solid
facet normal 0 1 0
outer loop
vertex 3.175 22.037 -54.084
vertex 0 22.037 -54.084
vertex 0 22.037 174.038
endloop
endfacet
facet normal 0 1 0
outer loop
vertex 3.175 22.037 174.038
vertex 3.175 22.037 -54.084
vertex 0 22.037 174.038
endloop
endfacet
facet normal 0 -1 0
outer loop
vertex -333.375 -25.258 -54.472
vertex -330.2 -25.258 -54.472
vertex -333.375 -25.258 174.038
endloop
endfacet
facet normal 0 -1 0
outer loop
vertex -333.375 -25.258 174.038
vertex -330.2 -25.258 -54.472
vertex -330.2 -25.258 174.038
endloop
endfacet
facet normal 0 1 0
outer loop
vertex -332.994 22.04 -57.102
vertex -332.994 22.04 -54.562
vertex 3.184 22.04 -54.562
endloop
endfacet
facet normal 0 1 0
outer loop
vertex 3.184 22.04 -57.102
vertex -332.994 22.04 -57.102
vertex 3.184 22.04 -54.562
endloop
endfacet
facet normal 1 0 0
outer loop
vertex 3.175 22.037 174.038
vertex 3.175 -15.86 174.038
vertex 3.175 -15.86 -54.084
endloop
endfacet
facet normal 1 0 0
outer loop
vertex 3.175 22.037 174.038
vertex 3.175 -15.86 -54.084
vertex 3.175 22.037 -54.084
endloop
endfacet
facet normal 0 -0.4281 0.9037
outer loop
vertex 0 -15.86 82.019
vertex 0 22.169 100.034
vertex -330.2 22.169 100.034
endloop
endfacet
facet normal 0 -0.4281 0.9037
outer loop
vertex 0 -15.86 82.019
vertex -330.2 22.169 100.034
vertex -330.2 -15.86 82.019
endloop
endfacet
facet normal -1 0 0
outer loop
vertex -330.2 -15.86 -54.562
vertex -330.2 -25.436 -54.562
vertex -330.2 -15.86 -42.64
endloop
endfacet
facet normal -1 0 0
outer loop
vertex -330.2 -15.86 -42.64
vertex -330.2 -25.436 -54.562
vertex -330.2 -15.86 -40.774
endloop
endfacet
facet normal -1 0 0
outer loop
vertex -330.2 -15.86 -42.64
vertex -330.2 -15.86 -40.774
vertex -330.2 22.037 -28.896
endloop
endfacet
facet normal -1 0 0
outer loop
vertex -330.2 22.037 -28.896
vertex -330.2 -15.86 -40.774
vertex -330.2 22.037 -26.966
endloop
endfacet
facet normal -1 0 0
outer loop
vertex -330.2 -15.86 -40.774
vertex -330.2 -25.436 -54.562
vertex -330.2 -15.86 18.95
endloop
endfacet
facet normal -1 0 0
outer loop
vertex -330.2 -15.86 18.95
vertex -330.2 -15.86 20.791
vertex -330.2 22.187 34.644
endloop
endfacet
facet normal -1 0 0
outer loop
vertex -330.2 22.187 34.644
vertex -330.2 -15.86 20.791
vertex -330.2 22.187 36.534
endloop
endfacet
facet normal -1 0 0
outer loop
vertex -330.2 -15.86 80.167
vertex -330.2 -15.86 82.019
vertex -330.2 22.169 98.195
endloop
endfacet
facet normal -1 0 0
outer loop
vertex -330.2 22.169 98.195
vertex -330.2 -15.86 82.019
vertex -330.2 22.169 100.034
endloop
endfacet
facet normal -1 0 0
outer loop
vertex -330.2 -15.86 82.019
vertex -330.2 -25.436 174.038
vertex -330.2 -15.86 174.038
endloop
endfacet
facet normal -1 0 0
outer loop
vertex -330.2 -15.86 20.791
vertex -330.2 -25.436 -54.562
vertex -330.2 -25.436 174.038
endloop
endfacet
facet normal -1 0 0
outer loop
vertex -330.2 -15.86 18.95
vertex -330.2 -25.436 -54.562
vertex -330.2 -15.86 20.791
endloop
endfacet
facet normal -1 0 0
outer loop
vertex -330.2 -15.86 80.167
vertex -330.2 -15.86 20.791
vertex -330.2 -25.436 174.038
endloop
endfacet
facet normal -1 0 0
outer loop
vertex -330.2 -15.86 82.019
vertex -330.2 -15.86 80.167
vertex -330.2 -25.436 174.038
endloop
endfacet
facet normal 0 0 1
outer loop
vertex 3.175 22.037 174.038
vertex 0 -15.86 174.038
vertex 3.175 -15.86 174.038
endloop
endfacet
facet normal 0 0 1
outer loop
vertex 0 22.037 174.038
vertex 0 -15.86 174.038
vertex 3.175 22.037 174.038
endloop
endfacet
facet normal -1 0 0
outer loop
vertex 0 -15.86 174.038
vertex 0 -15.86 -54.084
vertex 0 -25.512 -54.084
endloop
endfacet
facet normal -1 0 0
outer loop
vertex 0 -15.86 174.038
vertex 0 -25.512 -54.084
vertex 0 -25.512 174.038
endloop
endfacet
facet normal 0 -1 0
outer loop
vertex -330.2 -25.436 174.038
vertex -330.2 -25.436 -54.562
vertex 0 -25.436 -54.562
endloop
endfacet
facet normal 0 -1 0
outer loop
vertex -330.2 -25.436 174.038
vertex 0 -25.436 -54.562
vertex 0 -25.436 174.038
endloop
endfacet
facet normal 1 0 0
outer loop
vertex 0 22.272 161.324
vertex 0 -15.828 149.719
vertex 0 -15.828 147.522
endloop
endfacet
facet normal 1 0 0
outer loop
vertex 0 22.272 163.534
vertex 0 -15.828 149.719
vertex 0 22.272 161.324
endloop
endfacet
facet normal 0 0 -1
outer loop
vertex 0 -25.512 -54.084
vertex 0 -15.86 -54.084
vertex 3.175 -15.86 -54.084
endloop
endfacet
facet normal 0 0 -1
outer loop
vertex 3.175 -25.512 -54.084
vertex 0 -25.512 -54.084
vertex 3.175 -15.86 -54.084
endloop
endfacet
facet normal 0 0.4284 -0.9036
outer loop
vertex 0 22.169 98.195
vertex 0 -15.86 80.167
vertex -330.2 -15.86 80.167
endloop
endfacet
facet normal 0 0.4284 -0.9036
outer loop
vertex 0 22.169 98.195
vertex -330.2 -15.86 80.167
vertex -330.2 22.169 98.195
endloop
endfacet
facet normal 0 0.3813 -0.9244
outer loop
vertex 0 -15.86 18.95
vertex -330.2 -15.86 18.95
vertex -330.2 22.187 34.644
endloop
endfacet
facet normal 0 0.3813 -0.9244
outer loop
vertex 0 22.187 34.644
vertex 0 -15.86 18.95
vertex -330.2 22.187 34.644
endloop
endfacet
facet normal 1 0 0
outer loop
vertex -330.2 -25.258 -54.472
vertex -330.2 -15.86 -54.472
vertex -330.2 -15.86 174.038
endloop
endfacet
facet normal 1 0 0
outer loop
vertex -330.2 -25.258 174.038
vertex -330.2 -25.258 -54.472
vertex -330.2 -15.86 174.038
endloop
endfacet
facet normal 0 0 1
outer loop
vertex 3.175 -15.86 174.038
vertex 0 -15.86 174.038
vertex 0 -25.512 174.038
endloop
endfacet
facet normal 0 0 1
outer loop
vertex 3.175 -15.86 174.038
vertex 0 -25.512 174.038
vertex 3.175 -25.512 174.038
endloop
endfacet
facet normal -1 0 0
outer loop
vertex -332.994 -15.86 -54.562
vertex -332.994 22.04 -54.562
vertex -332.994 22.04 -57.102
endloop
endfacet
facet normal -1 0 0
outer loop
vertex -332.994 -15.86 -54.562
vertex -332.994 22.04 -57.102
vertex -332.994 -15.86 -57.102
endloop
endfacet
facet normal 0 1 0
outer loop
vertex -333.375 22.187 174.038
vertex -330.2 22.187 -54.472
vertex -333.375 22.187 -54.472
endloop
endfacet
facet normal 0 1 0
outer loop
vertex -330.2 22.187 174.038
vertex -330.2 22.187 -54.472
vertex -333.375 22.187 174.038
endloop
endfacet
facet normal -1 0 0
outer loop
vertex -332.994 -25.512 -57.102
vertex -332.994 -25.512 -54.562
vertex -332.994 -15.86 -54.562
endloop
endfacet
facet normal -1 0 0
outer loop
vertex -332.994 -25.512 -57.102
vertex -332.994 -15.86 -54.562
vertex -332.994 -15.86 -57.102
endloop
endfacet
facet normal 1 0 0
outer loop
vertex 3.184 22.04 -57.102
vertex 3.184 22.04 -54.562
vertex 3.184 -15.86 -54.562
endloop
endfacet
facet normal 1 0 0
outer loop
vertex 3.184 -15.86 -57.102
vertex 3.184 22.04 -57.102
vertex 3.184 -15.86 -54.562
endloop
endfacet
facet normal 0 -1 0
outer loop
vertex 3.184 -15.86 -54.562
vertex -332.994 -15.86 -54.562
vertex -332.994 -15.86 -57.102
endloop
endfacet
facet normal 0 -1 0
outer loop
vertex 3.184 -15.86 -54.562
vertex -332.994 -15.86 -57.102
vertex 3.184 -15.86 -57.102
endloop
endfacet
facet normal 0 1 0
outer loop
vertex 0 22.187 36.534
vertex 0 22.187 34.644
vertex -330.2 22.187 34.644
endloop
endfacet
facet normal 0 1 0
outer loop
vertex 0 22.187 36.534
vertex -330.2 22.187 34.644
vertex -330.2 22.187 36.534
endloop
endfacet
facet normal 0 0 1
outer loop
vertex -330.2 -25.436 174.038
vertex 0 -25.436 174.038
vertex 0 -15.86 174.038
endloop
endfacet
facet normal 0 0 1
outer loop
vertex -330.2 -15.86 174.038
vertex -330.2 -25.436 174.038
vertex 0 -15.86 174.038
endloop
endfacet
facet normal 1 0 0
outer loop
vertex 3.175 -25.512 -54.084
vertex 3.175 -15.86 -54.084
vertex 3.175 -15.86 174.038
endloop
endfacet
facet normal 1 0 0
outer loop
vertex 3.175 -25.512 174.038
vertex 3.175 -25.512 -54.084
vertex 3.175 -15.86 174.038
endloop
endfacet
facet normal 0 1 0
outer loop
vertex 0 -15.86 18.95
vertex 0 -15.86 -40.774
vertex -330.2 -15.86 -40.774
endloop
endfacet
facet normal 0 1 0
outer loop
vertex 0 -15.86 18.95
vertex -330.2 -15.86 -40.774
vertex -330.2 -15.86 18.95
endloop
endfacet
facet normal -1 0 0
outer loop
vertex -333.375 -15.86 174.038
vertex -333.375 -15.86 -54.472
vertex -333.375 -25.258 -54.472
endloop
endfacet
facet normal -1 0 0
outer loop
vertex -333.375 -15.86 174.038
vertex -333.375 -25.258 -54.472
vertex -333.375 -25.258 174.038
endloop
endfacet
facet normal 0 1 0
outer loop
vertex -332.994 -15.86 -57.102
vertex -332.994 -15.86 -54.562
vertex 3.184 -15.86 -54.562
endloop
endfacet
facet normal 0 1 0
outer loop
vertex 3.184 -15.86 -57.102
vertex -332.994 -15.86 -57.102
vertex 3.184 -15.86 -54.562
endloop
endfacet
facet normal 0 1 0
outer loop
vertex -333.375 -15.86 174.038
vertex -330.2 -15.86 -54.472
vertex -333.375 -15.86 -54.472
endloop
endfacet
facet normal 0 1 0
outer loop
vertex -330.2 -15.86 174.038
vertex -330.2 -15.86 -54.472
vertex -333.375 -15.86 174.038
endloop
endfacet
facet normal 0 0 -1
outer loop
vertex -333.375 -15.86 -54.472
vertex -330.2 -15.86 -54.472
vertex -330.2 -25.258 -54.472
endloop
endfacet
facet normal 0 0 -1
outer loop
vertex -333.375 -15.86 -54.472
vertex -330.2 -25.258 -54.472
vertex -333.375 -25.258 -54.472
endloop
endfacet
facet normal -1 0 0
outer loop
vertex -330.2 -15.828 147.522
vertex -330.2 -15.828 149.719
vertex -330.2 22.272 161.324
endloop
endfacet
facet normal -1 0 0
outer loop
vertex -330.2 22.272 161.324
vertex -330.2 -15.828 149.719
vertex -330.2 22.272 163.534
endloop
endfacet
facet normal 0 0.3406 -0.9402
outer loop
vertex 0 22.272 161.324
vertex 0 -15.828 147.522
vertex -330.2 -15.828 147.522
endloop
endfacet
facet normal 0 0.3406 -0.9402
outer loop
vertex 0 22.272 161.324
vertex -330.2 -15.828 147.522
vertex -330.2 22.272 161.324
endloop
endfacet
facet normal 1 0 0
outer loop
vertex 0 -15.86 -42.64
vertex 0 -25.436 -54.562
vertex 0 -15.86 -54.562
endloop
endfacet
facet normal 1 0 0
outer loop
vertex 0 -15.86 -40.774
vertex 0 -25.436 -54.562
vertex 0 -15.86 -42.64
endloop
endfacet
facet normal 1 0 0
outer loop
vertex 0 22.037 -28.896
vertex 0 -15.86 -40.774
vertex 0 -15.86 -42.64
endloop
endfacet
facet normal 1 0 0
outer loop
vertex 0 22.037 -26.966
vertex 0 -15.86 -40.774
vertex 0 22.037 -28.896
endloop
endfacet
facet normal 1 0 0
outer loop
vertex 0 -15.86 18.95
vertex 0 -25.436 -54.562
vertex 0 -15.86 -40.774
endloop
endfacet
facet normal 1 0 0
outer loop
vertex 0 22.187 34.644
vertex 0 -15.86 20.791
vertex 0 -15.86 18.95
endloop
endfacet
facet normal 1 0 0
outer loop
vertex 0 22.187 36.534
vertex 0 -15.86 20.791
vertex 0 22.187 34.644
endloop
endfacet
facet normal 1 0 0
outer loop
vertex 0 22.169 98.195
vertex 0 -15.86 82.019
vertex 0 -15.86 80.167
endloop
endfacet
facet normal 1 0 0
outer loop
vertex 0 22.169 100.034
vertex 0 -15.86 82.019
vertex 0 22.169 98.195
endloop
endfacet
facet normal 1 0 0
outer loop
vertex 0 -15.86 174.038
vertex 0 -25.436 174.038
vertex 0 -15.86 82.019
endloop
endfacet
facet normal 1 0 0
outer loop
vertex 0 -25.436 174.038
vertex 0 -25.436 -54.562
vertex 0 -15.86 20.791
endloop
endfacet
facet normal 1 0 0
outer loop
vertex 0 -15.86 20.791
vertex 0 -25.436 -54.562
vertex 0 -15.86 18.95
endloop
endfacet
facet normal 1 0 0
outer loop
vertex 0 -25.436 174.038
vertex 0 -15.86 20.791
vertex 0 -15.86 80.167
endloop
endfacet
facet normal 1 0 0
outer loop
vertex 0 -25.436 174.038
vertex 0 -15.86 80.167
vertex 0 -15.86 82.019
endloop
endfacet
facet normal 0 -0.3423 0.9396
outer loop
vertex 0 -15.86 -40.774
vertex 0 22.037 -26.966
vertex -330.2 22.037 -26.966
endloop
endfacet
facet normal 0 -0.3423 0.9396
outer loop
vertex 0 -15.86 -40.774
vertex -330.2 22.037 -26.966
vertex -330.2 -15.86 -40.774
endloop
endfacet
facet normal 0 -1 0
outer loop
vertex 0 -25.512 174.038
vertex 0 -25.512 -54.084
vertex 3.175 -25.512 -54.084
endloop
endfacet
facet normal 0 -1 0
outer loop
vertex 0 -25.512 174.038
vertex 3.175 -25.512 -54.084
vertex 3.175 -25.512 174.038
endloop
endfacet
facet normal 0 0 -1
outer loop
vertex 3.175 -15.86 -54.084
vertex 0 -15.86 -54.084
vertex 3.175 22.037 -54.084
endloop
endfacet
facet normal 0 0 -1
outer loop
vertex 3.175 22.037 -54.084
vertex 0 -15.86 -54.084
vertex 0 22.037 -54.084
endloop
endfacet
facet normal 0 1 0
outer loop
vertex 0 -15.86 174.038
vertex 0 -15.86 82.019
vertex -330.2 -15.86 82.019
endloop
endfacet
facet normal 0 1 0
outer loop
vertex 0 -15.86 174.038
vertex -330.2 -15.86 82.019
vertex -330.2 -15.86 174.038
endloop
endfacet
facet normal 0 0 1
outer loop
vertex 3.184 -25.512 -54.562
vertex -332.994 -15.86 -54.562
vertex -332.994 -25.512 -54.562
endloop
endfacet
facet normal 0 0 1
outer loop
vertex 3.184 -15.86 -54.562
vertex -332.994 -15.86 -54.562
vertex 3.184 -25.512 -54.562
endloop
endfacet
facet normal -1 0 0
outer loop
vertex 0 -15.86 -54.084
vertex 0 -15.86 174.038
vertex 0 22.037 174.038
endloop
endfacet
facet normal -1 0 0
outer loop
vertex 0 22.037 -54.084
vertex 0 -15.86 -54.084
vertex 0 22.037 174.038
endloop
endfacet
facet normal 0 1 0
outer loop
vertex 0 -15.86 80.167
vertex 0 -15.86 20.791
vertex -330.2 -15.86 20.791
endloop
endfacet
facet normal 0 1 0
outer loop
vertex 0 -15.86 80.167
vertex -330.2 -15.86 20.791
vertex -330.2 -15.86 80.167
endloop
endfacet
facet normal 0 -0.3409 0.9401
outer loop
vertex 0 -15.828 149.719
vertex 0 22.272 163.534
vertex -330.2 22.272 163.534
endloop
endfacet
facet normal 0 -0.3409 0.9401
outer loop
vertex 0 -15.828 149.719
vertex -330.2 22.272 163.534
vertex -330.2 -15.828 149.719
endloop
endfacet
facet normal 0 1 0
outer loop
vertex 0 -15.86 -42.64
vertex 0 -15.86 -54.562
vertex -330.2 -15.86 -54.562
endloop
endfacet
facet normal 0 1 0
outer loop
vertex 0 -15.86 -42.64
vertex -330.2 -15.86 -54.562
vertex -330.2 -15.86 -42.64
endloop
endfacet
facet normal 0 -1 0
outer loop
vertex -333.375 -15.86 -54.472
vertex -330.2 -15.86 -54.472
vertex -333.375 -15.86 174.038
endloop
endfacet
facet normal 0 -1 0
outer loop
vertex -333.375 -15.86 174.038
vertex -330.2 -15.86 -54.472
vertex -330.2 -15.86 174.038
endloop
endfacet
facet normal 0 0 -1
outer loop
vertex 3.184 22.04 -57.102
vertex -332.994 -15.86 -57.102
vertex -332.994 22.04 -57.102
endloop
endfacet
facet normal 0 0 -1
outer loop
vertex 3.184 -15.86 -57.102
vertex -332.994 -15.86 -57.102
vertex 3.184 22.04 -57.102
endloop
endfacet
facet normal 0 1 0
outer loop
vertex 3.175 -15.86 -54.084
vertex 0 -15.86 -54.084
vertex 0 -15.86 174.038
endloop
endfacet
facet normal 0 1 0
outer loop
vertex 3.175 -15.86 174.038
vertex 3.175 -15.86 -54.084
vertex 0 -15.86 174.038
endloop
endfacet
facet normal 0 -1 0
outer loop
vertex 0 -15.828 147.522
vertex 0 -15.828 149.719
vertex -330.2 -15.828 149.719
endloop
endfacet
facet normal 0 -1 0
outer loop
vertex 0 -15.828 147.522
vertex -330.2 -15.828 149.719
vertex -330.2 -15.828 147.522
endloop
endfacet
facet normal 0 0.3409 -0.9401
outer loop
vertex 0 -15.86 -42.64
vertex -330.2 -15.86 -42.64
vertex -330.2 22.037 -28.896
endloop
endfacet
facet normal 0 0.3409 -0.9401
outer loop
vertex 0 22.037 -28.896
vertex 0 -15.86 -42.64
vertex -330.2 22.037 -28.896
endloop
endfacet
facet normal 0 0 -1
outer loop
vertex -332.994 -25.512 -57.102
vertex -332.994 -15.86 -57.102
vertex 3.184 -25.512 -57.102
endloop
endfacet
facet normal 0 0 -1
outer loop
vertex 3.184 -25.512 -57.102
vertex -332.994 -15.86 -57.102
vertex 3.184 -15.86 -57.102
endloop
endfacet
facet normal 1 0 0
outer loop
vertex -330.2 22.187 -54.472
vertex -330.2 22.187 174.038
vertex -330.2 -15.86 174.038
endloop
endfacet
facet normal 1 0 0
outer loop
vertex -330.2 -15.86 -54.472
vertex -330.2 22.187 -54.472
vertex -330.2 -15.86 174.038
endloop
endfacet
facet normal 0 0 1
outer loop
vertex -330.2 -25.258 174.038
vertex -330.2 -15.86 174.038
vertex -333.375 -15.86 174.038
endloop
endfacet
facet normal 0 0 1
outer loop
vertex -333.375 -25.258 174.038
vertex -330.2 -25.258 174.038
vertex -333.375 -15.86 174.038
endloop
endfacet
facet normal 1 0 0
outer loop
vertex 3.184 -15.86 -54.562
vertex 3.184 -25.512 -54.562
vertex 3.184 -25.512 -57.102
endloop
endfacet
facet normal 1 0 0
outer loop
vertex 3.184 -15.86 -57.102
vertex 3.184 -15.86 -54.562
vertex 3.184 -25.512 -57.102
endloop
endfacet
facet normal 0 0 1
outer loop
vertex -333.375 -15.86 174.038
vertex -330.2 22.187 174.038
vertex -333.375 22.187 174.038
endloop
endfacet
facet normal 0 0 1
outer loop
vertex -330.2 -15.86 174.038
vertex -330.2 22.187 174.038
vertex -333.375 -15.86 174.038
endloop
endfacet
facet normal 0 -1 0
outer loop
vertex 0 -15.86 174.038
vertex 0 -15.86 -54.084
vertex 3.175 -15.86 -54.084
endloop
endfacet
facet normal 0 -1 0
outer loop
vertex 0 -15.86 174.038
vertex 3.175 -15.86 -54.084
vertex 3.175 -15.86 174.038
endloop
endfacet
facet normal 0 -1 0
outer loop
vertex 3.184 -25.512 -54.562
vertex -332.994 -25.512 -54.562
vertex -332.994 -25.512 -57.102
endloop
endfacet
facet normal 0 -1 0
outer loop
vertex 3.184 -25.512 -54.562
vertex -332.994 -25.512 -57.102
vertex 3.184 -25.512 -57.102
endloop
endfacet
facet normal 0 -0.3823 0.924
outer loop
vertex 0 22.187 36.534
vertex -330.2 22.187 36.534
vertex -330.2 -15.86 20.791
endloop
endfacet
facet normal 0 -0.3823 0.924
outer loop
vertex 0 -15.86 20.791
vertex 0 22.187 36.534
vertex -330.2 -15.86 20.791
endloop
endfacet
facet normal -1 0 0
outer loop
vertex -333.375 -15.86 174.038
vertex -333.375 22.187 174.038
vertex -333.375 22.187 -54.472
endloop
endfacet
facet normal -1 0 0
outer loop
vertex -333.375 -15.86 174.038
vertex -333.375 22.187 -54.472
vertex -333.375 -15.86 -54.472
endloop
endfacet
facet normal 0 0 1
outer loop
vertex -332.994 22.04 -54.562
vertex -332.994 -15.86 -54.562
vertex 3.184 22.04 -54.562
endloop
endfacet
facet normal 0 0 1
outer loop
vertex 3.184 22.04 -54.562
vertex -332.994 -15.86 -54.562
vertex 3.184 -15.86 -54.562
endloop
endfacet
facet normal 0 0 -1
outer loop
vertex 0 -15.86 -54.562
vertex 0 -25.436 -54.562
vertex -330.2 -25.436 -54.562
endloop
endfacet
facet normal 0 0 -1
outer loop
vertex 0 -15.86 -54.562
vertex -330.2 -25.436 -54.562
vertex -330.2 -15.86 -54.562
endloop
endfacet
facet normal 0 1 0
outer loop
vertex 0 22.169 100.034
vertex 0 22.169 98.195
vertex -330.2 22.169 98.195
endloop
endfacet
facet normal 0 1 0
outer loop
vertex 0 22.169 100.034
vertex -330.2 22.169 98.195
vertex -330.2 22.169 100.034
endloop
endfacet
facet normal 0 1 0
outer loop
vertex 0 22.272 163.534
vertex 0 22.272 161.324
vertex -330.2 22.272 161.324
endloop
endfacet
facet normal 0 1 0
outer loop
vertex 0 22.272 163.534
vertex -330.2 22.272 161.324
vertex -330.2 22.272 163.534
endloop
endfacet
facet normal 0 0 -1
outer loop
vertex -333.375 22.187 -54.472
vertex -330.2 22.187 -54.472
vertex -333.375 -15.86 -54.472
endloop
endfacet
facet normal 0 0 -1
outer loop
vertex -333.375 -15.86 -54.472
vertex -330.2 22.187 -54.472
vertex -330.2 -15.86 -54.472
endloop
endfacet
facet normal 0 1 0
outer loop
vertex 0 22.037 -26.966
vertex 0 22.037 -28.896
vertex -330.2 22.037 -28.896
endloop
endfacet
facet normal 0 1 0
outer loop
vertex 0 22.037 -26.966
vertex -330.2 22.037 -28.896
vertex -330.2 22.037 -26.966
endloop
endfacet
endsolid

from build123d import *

# Parameters (mm, degrees)
F0_W      = 9.5758
F0_H      = 228.6
F1_DEPTH  = 330.2
F3_DEPTH  = 330.2
F4_W      = 38.0470480231
F4_H      = 228.509646448
F5_DEPTH  = 3.175
F6_W      = 37.8971553801
F6_H      = 228.1222460593
F7_DEPTH  = 3.175
F8_W      = 336.1774778459
F8_H      = 37.8997616915
F9_DEPTH  = 2.54
F10_DEPTH = 9.398
F11_DEPTH = 9.652
F12_DEPTH = 9.652


# Not quite as in the source:
# - a feature names something its author has since deleted; it is built from what else it names


with BuildPart() as f1:
    # F0 (on Right) → F1 (new body)
    with BuildSketch(Plane.YZ):
        with Locations((-20.647819831, 59.7378891851)):
            Rectangle(F0_W, F0_H)
    extrude(amount=-F1_DEPTH)

    # F2 (on Right) → F3 (join)
    with BuildSketch(Plane.YZ):
        Polygon((22.0372355491, -26.9659241096), (-16.0627644509, -40.8476963639), (-16.0627644509, -42.7134521306), (22.0372355491, -28.8960468024), align=None)
        Polygon((22.1871281922, 36.5340758904), (-15.9128718078, 20.7688752562), (-15.9128718078, 18.928617239), (22.1871281922, 34.6444733441), align=None)
        Polygon((22.1694405138, 100.0340758904), (-15.9305594862, 81.9853842258), (-15.9305594862, 80.1339223981), (22.1694405138, 98.1948003173), align=None)
    extrude(amount=-F3_DEPTH)


with BuildPart() as f3:
    # F2 (on Right) → F3, piece 2 (new body)
    with BuildSketch(Plane.YZ):
        Polygon((22.2718652983, 163.5340758904), (-15.8281347017, 149.7193872929), (-15.8281347017, 147.5223718815), (22.2718652983, 161.3244234257), align=None)
    extrude(amount=-F3_DEPTH)


with BuildPart() as f5:
    # F4 (on face) → F5 (new body)
    with BuildSketch(Plane(origin=(-330.2, 0, 0), x_dir=(0, -1, 0), z_dir=(-1, 0, 0))):
        with Locations((-3.1636041806, 59.7830659611)):
            Rectangle(F4_W, F4_H)
    extrude(amount=F5_DEPTH)


with BuildPart() as f7:
    # F6 (on face) → F7 (new body)
    with BuildSketch(Plane.YZ):
        with Locations((3.0886578591, 59.9767661554)):
            Rectangle(F6_W, F6_H)
    extrude(amount=F7_DEPTH)


with BuildPart() as f9:
    # F8 (on face) → F9 (new body)
    with BuildSketch(Plane(origin=(0, 0, -54.5621108149), x_dir=(1, 0, 0), z_dir=(0, 0, -1))):
        with Locations((-164.9049472762, -3.0899610148)):
            Rectangle(F8_W, F8_H)
    extrude(amount=F9_DEPTH)


with BuildPart() as f10:
    # F10 (new): a face of the model
    f10_faces = [f5.part.faces().sort_by_distance(p)[0] for p in [
        (-331.7875, -15.859919831, 59.7830659611),
    ]]
    extrude(f10_faces, amount=F10_DEPTH)


with BuildPart() as f11:
    # F11 (new): a face of the model
    f11_faces = [f9.part.faces().sort_by_distance(p)[0] for p in [
        (-164.9049472762, -15.859919831, -55.8321108149),
    ]]
    extrude(f11_faces, amount=F11_DEPTH)


with BuildPart() as f12:
    # F12 (new): a face of the model
    f12_faces = [f7.part.faces().sort_by_distance(p)[0] for p in [
        (1.5875, -15.859919831, 59.9767661554),
    ]]
    extrude(f12_faces, amount=F12_DEPTH)


solid = Compound([f1.part, f3.part, f5.part, f7.part, f9.part, f10.part, f11.part, f12.part])
